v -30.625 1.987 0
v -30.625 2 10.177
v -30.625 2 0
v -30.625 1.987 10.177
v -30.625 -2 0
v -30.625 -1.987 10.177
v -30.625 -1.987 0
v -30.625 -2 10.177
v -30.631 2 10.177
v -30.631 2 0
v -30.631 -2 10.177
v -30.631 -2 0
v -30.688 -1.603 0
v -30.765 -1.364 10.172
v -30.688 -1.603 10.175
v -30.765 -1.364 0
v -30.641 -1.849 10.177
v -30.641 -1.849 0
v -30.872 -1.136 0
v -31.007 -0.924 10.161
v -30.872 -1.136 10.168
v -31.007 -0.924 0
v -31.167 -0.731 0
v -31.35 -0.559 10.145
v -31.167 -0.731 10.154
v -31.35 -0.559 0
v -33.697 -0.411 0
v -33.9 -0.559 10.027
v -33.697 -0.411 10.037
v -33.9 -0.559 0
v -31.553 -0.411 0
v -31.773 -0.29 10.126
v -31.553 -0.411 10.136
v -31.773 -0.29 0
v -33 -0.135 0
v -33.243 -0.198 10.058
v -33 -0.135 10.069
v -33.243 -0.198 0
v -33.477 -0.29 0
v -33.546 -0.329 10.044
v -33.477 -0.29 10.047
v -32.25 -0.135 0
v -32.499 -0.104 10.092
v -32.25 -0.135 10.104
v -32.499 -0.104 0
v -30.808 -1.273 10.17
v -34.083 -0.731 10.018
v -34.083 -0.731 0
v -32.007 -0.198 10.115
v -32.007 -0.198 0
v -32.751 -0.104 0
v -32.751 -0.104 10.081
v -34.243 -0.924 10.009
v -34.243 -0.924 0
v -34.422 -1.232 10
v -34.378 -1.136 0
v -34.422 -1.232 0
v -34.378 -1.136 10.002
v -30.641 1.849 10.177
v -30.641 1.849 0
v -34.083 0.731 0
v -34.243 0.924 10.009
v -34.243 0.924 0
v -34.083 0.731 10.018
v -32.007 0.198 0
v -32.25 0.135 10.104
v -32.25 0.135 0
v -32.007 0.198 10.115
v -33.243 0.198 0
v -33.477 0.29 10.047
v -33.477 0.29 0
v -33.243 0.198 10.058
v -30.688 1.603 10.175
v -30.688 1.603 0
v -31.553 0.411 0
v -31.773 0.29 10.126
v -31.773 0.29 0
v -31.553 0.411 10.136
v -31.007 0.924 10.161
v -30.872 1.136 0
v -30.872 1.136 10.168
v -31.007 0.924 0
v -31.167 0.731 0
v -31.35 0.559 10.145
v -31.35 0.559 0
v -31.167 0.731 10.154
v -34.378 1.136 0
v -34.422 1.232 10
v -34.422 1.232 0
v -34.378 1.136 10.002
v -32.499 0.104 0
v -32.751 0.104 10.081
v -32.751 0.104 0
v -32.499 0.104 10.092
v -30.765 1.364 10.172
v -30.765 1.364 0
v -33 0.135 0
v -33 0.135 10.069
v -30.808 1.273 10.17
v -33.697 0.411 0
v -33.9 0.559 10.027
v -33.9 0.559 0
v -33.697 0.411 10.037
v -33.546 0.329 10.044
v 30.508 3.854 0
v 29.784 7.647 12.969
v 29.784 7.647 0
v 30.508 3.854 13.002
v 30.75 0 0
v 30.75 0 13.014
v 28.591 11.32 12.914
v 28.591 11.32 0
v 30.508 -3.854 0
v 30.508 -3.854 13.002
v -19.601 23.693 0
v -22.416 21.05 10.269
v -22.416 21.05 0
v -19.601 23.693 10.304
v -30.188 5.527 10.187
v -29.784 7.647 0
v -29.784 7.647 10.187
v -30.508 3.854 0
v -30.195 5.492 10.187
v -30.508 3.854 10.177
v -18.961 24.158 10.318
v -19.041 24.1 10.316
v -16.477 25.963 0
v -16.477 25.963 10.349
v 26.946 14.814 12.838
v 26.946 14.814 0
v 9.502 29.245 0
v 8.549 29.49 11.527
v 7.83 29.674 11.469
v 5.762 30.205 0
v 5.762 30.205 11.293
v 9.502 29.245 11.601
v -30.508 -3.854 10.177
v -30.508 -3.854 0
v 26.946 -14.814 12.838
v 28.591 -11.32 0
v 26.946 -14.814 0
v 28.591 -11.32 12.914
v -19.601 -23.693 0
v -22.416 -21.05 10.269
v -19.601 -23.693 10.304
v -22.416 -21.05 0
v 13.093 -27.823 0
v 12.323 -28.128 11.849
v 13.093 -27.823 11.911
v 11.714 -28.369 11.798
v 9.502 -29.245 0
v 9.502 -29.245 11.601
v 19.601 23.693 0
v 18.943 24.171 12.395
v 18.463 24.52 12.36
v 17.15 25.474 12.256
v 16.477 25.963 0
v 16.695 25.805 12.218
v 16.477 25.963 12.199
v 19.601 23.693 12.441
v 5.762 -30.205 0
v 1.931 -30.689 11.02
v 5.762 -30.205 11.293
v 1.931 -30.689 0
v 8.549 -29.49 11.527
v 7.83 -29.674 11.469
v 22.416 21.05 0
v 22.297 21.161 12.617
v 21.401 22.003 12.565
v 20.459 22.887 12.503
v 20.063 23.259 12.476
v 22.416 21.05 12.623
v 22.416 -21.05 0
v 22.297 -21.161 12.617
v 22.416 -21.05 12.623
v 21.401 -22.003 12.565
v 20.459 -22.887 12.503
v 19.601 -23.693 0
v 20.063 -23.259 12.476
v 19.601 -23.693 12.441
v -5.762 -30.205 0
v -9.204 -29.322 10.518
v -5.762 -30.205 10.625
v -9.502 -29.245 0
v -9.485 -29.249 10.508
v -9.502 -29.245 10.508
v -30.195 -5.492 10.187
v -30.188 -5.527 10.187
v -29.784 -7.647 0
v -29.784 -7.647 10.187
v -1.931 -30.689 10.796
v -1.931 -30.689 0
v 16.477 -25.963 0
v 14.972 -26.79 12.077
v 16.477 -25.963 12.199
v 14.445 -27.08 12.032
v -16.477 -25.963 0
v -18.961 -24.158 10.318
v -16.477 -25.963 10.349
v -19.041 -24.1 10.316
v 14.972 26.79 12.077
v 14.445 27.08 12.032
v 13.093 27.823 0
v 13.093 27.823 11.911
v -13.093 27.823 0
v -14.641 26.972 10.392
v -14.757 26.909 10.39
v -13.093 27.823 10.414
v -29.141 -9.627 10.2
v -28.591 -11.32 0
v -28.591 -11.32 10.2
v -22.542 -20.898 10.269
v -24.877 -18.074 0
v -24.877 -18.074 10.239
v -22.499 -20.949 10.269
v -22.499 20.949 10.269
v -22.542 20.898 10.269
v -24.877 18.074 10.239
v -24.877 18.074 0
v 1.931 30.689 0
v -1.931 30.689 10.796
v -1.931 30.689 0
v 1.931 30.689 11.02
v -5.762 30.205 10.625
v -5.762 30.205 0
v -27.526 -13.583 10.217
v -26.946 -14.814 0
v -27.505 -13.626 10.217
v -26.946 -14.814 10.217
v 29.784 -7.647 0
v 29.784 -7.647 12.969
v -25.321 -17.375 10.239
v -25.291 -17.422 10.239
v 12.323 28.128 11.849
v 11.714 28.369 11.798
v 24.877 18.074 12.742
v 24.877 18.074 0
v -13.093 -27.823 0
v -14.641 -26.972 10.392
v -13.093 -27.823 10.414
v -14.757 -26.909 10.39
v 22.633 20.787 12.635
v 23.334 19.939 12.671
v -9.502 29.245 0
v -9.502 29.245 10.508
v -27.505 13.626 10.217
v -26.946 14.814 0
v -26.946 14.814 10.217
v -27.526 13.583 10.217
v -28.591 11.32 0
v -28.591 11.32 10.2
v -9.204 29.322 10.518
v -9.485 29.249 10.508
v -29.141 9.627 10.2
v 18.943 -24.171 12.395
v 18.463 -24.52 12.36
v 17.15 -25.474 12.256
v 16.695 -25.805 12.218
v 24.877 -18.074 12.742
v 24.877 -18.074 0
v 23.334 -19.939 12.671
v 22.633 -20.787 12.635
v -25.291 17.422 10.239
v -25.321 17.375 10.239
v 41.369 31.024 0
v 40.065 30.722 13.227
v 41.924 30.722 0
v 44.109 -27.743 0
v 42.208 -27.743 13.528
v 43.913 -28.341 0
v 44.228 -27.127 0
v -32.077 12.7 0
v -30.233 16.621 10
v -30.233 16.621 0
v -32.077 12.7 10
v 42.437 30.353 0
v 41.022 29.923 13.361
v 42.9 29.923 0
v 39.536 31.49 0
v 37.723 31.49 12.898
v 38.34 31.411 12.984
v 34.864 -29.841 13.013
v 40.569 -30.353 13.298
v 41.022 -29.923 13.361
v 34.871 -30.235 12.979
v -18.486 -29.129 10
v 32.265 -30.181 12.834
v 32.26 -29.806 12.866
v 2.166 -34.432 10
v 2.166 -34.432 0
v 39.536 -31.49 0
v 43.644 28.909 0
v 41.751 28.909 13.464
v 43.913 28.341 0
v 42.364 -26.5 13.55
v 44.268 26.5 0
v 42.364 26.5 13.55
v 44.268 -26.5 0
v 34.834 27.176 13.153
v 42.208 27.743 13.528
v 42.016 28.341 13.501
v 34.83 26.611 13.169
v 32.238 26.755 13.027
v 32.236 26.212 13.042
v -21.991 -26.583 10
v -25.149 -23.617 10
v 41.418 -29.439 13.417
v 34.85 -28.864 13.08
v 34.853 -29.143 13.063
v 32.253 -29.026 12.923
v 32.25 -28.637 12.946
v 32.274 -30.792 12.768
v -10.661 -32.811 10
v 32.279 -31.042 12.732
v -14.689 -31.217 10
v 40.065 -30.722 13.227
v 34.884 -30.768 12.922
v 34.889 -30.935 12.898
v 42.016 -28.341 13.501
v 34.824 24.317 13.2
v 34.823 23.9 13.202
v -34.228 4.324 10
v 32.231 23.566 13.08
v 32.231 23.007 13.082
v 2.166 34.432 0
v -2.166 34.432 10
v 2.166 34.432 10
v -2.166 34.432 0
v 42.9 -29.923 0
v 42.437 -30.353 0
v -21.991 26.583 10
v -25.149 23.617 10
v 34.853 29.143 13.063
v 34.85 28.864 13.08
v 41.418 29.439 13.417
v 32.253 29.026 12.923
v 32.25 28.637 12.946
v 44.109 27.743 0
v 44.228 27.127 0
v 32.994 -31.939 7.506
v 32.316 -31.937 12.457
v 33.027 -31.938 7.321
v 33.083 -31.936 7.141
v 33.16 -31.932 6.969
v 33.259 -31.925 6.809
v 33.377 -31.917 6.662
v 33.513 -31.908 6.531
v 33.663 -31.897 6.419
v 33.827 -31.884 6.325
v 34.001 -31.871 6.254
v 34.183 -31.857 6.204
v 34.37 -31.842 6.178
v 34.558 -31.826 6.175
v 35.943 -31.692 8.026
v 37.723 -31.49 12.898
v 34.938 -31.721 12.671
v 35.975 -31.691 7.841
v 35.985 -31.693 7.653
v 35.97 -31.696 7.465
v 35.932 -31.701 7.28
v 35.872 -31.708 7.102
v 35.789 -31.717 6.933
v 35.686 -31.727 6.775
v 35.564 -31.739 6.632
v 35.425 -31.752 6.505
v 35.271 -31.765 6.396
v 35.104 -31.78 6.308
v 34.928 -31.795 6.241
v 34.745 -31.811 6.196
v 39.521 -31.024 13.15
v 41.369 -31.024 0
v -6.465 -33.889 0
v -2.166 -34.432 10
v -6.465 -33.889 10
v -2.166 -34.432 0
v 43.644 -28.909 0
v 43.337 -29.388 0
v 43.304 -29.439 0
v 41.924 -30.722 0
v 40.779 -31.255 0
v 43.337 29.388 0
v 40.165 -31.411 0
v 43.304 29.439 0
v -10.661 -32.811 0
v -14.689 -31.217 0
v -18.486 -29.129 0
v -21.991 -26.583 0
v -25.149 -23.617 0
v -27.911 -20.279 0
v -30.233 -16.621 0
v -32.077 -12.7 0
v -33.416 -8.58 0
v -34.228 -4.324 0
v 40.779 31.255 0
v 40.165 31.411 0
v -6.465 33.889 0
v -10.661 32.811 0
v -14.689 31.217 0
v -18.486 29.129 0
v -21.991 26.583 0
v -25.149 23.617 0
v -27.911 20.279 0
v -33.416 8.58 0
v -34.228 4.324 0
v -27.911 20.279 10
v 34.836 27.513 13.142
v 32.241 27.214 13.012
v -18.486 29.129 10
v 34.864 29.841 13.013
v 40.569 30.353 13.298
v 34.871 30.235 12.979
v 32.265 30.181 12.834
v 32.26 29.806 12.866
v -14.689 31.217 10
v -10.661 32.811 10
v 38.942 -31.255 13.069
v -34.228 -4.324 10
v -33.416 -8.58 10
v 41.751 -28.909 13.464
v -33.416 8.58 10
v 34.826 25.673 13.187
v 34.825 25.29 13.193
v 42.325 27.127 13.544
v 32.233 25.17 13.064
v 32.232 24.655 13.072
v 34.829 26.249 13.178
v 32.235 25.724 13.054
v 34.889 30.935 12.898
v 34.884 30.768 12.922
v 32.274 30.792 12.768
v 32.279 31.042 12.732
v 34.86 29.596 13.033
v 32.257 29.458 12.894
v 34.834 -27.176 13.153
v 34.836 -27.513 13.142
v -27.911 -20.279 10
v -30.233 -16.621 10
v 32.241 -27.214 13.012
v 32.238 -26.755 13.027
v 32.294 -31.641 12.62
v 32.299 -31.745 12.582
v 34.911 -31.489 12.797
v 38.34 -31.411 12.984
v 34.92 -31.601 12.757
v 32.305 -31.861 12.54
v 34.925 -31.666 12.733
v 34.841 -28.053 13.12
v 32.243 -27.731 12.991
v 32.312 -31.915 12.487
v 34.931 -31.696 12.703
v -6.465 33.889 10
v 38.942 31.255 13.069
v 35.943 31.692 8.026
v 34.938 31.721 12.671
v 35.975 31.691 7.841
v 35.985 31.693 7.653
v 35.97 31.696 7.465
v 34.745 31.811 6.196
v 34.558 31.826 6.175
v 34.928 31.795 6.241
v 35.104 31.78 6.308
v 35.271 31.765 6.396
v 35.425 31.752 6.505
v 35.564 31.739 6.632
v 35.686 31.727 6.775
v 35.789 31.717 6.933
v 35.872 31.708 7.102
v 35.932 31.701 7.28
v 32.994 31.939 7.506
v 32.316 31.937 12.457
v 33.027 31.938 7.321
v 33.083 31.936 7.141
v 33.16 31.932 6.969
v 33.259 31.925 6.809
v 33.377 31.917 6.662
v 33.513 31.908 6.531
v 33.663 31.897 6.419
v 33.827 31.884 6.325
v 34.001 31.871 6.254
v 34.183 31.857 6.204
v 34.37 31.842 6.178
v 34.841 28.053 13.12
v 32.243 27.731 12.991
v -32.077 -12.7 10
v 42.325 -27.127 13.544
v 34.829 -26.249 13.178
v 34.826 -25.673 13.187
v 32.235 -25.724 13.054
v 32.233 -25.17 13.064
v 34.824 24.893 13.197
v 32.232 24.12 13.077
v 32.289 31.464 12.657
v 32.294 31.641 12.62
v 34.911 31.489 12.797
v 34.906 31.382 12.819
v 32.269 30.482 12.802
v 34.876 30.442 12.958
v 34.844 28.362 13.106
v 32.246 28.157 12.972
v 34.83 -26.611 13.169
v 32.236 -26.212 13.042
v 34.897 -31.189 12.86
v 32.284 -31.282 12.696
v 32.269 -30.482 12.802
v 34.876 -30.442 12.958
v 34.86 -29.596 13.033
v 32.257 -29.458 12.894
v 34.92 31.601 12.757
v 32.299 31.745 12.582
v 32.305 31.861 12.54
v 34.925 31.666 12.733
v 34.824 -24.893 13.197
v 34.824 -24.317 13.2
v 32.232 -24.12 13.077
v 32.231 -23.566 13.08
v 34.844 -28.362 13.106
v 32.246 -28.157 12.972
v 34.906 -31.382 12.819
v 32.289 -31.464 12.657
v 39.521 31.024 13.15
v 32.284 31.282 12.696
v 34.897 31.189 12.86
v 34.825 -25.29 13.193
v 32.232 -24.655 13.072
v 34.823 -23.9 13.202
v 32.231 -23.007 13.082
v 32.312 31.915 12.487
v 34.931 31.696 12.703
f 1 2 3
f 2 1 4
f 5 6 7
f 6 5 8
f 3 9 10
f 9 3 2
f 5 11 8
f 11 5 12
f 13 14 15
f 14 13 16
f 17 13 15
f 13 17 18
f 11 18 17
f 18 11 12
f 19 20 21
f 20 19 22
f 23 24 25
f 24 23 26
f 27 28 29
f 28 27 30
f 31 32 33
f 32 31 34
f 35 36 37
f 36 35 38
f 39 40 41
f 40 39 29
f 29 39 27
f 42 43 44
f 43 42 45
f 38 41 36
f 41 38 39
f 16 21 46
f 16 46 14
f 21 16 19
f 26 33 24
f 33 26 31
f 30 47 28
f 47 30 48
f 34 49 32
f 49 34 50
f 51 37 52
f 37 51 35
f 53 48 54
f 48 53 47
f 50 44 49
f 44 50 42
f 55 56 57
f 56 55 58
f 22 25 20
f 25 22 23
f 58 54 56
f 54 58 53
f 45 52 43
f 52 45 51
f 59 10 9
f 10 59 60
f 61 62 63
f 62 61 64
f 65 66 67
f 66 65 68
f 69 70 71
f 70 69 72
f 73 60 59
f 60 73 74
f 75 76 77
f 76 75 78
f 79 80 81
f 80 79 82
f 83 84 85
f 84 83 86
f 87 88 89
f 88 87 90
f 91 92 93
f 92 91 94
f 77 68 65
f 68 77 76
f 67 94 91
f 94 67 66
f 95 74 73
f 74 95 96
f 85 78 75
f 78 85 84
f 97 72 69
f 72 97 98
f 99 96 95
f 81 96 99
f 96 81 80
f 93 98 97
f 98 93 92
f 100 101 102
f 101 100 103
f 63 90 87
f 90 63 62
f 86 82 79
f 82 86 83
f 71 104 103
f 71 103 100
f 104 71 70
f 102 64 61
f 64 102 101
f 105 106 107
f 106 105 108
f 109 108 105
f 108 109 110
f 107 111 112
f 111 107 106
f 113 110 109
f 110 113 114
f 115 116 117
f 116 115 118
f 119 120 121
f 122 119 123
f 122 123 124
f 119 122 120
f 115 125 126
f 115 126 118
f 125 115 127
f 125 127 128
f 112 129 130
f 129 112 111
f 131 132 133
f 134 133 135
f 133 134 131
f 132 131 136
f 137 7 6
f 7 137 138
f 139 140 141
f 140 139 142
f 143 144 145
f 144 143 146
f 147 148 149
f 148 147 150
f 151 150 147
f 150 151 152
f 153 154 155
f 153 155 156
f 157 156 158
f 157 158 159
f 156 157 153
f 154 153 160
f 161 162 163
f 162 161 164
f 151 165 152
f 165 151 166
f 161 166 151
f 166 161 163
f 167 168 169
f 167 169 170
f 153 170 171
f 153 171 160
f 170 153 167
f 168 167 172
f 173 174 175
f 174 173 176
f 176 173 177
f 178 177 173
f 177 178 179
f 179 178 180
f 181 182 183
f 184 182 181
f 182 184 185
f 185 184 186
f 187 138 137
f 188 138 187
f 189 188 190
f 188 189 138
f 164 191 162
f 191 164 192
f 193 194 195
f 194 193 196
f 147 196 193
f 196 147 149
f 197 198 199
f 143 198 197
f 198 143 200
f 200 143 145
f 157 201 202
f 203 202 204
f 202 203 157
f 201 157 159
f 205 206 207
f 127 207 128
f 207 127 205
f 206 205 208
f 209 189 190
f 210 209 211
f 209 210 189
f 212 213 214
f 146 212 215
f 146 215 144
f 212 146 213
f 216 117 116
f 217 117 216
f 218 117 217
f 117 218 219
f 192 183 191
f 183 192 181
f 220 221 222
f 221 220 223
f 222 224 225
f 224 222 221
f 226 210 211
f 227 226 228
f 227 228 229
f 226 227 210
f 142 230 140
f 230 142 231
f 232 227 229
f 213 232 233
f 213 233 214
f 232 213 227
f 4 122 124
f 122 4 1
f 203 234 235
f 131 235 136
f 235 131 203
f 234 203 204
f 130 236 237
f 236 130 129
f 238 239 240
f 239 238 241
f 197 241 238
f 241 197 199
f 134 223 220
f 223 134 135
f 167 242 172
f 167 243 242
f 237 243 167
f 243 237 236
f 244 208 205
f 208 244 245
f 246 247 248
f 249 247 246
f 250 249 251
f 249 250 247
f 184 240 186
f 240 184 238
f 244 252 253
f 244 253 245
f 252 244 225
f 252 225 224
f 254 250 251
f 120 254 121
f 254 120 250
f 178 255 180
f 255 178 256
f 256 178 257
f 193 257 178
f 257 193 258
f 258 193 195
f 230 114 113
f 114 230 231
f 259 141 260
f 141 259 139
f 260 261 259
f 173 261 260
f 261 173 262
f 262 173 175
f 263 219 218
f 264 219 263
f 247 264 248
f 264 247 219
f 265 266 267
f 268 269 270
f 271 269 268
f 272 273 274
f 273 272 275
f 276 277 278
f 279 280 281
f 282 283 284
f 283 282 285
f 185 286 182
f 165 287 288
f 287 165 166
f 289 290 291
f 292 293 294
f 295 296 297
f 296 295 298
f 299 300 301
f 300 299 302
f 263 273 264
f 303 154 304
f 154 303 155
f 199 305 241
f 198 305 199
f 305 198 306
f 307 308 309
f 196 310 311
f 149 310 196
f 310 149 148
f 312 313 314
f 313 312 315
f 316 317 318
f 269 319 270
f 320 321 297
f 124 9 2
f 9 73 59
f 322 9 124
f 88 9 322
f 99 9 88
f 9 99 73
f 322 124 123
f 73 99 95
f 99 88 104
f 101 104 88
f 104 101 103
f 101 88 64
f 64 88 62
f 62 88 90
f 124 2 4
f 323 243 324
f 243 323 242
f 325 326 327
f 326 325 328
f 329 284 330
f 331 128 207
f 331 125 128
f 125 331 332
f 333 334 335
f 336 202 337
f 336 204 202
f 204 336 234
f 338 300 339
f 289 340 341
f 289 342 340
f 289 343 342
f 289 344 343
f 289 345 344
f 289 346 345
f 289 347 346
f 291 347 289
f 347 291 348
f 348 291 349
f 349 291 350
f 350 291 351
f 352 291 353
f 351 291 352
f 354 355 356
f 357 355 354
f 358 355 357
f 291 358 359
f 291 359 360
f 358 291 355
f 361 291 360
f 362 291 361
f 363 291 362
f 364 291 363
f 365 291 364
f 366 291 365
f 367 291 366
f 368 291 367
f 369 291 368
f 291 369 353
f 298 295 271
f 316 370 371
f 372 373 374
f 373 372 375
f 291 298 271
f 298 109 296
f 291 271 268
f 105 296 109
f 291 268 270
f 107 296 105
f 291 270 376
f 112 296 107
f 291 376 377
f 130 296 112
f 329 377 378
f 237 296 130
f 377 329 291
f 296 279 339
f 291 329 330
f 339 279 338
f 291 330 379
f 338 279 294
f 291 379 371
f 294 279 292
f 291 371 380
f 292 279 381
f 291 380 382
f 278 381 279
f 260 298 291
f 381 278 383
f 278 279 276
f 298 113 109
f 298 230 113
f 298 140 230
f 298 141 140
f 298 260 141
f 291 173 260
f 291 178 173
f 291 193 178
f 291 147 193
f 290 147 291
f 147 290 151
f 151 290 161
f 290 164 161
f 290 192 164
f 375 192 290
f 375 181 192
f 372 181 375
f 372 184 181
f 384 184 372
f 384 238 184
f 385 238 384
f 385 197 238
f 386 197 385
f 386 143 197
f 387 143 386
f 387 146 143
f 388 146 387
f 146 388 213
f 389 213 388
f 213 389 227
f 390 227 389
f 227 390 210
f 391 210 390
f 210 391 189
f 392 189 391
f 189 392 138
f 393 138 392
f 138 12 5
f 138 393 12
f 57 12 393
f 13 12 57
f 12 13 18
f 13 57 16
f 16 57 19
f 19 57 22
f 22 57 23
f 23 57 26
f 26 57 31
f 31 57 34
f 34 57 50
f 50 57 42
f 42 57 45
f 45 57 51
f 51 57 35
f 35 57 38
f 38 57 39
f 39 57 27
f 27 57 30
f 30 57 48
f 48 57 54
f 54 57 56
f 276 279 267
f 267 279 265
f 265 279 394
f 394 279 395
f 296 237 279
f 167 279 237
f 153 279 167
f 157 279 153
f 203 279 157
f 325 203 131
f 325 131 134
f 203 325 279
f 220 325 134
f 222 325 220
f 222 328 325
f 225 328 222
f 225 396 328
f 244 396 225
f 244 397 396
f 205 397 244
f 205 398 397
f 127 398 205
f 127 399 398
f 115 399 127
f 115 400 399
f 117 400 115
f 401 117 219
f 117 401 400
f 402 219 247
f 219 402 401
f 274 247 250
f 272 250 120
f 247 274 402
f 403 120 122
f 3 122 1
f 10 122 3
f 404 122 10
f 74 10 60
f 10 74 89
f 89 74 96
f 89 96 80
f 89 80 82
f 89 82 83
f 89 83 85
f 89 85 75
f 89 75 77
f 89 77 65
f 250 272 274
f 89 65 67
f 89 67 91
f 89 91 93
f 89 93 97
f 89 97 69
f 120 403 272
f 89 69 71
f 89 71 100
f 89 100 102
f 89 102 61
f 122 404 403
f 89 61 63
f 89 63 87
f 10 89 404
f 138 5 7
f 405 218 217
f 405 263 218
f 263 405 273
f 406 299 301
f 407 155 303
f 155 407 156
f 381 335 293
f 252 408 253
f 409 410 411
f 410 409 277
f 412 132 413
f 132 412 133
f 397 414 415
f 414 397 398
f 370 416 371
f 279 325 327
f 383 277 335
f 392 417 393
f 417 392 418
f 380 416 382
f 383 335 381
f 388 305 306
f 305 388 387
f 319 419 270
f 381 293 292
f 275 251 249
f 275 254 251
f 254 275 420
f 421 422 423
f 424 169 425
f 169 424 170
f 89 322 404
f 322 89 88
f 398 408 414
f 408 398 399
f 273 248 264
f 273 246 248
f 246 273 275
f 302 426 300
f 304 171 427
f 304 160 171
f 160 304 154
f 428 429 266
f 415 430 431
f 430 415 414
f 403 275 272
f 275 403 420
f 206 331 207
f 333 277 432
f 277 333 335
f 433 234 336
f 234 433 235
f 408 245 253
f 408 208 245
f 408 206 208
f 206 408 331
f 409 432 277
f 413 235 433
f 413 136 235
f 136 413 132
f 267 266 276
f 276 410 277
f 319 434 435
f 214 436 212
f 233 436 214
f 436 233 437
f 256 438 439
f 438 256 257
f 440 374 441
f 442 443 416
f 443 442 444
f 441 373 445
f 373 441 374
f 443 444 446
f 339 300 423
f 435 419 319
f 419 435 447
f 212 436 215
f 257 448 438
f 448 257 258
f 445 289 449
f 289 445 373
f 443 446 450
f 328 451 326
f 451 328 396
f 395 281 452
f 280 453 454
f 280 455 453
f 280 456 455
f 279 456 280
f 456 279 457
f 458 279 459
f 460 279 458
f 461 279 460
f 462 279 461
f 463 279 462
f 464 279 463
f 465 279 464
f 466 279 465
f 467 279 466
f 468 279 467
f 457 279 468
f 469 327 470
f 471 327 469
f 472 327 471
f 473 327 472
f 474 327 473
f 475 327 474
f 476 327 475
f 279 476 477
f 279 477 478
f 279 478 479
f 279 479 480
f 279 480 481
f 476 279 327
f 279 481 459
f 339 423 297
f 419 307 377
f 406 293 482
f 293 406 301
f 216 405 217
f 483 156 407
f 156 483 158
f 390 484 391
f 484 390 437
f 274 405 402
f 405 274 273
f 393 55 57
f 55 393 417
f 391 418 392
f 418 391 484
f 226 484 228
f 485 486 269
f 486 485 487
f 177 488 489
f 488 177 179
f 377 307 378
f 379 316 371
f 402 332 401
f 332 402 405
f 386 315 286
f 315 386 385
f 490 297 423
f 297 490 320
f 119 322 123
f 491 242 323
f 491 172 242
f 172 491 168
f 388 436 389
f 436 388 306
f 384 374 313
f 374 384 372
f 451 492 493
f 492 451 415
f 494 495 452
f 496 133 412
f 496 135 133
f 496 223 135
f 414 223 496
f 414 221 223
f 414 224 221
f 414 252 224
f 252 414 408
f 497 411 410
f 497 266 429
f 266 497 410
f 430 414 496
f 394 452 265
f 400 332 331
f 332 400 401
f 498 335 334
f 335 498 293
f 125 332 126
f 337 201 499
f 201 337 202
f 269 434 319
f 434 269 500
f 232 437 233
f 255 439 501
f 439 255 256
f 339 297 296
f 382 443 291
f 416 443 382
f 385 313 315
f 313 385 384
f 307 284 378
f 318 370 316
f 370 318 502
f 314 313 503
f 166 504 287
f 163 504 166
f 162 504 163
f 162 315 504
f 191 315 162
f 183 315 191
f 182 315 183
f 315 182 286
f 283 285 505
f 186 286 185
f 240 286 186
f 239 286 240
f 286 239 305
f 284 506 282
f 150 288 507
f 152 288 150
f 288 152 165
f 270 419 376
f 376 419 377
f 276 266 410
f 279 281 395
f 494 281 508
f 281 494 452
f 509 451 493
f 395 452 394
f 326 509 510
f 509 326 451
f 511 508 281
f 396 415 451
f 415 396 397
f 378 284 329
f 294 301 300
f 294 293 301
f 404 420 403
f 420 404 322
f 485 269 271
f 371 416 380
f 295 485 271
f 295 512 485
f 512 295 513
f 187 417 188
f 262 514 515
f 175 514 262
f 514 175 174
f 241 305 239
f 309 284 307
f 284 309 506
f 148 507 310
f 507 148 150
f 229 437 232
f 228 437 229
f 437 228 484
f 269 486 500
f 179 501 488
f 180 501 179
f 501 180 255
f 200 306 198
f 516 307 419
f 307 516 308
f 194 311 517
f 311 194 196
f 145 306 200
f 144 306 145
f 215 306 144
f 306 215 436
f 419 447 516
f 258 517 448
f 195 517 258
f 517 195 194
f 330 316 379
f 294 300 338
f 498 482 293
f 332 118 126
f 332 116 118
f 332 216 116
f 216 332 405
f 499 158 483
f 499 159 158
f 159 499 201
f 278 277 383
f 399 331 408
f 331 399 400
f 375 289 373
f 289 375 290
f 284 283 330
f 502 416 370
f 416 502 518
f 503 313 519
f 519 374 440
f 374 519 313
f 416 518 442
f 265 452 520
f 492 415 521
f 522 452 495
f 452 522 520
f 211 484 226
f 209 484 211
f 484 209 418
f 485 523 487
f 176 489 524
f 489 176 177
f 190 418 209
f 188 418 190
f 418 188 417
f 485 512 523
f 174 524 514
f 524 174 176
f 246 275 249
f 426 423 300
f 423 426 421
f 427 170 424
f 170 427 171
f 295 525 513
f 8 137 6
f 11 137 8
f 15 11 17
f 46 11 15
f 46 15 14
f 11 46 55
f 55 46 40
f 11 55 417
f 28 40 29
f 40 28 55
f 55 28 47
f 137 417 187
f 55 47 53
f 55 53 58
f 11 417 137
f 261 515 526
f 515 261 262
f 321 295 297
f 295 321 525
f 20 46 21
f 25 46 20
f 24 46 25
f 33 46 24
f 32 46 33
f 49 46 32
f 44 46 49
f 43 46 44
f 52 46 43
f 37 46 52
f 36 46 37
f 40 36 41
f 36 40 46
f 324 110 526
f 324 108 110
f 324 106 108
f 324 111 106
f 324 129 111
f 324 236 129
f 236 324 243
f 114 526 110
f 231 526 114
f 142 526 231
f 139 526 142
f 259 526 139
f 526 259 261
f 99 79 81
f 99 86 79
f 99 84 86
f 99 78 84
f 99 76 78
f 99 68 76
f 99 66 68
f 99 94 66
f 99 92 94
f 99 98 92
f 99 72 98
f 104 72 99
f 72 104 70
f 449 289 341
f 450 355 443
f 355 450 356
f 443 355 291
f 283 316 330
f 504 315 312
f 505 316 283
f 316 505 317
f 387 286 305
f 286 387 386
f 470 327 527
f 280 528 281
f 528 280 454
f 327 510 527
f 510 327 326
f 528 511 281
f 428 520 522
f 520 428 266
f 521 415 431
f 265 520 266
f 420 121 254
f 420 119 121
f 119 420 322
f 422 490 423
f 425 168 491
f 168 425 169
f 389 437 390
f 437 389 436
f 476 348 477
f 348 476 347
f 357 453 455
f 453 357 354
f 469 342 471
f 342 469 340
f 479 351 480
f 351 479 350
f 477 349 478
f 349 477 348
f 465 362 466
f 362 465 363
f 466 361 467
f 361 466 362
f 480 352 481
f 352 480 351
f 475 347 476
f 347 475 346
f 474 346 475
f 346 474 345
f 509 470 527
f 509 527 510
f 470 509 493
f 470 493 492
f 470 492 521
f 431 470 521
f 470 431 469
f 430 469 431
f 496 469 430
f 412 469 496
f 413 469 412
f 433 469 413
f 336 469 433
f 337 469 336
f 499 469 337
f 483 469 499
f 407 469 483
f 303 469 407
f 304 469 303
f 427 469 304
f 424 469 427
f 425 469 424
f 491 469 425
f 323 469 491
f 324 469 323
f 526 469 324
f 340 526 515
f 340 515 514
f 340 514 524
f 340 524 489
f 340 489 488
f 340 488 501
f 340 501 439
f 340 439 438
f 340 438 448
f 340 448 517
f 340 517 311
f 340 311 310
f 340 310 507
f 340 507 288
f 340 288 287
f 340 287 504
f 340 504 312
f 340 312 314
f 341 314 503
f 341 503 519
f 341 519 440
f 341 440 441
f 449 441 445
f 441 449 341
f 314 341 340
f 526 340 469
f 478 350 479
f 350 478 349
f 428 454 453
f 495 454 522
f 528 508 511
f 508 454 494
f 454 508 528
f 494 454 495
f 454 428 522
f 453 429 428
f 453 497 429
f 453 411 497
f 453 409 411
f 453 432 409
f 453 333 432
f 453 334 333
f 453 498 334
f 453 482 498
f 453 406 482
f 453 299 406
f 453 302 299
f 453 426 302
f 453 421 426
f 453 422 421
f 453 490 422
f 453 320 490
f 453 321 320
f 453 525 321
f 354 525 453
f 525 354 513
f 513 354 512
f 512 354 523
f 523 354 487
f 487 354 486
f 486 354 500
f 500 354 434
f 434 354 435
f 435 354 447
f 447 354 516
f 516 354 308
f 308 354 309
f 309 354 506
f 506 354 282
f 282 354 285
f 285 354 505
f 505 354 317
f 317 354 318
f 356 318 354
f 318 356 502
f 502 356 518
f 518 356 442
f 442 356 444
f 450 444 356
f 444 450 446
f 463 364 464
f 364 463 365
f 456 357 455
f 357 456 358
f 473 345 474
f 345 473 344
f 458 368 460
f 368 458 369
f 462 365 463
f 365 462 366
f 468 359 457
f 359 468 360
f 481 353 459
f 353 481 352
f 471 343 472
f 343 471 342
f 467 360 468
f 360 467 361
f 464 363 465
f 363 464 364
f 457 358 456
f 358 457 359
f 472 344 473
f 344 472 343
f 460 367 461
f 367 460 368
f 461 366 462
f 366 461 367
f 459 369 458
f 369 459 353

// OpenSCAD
// bottle diameter
D=60;

water_bottle(D);

module water_bottle(D=60) {
$fn=50;
d=D/8 < 5.5 ? 5.5 : D/8;
z=D+d+1.5;
zz=z+10;

difference() {

// main shape
hull() {
	cylinder(d=z, h=10);
	difference() {
	union() {
		translate([zz/2, z/2-8, -2]) rotate([0, -8, 0]) cylinder(d=10, h=15);
		translate([zz/2, -z/2+8, -2]) rotate([0, -8, 0]) cylinder(d=10, h=15);
	}
	translate([-z/2, -zz/2, -4]) cube([zz, zz, 4]);
	}

}

// bottle hole
translate([0, 0, -1]) union() {
	dd=d/2+.25;
	translate([-z/2+d/4, 0, 0]) difference() {
		translate([0, 0, 17/2]) cube([dd, dd, 17], center=true);
		translate([0, -dd/2-.1, -1]) cylinder(d=dd, h=19);
		translate([0, dd/2+.1, -1]) cylinder(d=dd, h=19);
	}
	cylinder(d=D+1.5, h=17);
}

// wire cage notch
translate([(z-2)/2, -zz/2, 7.5]) rotate([0, -10, 0]) hull() {
	cube([2, zz, 13]);
	translate([1, zz, 0]) rotate([90, 90, 0]) cylinder(d=3, h=zz);
}

}
}
